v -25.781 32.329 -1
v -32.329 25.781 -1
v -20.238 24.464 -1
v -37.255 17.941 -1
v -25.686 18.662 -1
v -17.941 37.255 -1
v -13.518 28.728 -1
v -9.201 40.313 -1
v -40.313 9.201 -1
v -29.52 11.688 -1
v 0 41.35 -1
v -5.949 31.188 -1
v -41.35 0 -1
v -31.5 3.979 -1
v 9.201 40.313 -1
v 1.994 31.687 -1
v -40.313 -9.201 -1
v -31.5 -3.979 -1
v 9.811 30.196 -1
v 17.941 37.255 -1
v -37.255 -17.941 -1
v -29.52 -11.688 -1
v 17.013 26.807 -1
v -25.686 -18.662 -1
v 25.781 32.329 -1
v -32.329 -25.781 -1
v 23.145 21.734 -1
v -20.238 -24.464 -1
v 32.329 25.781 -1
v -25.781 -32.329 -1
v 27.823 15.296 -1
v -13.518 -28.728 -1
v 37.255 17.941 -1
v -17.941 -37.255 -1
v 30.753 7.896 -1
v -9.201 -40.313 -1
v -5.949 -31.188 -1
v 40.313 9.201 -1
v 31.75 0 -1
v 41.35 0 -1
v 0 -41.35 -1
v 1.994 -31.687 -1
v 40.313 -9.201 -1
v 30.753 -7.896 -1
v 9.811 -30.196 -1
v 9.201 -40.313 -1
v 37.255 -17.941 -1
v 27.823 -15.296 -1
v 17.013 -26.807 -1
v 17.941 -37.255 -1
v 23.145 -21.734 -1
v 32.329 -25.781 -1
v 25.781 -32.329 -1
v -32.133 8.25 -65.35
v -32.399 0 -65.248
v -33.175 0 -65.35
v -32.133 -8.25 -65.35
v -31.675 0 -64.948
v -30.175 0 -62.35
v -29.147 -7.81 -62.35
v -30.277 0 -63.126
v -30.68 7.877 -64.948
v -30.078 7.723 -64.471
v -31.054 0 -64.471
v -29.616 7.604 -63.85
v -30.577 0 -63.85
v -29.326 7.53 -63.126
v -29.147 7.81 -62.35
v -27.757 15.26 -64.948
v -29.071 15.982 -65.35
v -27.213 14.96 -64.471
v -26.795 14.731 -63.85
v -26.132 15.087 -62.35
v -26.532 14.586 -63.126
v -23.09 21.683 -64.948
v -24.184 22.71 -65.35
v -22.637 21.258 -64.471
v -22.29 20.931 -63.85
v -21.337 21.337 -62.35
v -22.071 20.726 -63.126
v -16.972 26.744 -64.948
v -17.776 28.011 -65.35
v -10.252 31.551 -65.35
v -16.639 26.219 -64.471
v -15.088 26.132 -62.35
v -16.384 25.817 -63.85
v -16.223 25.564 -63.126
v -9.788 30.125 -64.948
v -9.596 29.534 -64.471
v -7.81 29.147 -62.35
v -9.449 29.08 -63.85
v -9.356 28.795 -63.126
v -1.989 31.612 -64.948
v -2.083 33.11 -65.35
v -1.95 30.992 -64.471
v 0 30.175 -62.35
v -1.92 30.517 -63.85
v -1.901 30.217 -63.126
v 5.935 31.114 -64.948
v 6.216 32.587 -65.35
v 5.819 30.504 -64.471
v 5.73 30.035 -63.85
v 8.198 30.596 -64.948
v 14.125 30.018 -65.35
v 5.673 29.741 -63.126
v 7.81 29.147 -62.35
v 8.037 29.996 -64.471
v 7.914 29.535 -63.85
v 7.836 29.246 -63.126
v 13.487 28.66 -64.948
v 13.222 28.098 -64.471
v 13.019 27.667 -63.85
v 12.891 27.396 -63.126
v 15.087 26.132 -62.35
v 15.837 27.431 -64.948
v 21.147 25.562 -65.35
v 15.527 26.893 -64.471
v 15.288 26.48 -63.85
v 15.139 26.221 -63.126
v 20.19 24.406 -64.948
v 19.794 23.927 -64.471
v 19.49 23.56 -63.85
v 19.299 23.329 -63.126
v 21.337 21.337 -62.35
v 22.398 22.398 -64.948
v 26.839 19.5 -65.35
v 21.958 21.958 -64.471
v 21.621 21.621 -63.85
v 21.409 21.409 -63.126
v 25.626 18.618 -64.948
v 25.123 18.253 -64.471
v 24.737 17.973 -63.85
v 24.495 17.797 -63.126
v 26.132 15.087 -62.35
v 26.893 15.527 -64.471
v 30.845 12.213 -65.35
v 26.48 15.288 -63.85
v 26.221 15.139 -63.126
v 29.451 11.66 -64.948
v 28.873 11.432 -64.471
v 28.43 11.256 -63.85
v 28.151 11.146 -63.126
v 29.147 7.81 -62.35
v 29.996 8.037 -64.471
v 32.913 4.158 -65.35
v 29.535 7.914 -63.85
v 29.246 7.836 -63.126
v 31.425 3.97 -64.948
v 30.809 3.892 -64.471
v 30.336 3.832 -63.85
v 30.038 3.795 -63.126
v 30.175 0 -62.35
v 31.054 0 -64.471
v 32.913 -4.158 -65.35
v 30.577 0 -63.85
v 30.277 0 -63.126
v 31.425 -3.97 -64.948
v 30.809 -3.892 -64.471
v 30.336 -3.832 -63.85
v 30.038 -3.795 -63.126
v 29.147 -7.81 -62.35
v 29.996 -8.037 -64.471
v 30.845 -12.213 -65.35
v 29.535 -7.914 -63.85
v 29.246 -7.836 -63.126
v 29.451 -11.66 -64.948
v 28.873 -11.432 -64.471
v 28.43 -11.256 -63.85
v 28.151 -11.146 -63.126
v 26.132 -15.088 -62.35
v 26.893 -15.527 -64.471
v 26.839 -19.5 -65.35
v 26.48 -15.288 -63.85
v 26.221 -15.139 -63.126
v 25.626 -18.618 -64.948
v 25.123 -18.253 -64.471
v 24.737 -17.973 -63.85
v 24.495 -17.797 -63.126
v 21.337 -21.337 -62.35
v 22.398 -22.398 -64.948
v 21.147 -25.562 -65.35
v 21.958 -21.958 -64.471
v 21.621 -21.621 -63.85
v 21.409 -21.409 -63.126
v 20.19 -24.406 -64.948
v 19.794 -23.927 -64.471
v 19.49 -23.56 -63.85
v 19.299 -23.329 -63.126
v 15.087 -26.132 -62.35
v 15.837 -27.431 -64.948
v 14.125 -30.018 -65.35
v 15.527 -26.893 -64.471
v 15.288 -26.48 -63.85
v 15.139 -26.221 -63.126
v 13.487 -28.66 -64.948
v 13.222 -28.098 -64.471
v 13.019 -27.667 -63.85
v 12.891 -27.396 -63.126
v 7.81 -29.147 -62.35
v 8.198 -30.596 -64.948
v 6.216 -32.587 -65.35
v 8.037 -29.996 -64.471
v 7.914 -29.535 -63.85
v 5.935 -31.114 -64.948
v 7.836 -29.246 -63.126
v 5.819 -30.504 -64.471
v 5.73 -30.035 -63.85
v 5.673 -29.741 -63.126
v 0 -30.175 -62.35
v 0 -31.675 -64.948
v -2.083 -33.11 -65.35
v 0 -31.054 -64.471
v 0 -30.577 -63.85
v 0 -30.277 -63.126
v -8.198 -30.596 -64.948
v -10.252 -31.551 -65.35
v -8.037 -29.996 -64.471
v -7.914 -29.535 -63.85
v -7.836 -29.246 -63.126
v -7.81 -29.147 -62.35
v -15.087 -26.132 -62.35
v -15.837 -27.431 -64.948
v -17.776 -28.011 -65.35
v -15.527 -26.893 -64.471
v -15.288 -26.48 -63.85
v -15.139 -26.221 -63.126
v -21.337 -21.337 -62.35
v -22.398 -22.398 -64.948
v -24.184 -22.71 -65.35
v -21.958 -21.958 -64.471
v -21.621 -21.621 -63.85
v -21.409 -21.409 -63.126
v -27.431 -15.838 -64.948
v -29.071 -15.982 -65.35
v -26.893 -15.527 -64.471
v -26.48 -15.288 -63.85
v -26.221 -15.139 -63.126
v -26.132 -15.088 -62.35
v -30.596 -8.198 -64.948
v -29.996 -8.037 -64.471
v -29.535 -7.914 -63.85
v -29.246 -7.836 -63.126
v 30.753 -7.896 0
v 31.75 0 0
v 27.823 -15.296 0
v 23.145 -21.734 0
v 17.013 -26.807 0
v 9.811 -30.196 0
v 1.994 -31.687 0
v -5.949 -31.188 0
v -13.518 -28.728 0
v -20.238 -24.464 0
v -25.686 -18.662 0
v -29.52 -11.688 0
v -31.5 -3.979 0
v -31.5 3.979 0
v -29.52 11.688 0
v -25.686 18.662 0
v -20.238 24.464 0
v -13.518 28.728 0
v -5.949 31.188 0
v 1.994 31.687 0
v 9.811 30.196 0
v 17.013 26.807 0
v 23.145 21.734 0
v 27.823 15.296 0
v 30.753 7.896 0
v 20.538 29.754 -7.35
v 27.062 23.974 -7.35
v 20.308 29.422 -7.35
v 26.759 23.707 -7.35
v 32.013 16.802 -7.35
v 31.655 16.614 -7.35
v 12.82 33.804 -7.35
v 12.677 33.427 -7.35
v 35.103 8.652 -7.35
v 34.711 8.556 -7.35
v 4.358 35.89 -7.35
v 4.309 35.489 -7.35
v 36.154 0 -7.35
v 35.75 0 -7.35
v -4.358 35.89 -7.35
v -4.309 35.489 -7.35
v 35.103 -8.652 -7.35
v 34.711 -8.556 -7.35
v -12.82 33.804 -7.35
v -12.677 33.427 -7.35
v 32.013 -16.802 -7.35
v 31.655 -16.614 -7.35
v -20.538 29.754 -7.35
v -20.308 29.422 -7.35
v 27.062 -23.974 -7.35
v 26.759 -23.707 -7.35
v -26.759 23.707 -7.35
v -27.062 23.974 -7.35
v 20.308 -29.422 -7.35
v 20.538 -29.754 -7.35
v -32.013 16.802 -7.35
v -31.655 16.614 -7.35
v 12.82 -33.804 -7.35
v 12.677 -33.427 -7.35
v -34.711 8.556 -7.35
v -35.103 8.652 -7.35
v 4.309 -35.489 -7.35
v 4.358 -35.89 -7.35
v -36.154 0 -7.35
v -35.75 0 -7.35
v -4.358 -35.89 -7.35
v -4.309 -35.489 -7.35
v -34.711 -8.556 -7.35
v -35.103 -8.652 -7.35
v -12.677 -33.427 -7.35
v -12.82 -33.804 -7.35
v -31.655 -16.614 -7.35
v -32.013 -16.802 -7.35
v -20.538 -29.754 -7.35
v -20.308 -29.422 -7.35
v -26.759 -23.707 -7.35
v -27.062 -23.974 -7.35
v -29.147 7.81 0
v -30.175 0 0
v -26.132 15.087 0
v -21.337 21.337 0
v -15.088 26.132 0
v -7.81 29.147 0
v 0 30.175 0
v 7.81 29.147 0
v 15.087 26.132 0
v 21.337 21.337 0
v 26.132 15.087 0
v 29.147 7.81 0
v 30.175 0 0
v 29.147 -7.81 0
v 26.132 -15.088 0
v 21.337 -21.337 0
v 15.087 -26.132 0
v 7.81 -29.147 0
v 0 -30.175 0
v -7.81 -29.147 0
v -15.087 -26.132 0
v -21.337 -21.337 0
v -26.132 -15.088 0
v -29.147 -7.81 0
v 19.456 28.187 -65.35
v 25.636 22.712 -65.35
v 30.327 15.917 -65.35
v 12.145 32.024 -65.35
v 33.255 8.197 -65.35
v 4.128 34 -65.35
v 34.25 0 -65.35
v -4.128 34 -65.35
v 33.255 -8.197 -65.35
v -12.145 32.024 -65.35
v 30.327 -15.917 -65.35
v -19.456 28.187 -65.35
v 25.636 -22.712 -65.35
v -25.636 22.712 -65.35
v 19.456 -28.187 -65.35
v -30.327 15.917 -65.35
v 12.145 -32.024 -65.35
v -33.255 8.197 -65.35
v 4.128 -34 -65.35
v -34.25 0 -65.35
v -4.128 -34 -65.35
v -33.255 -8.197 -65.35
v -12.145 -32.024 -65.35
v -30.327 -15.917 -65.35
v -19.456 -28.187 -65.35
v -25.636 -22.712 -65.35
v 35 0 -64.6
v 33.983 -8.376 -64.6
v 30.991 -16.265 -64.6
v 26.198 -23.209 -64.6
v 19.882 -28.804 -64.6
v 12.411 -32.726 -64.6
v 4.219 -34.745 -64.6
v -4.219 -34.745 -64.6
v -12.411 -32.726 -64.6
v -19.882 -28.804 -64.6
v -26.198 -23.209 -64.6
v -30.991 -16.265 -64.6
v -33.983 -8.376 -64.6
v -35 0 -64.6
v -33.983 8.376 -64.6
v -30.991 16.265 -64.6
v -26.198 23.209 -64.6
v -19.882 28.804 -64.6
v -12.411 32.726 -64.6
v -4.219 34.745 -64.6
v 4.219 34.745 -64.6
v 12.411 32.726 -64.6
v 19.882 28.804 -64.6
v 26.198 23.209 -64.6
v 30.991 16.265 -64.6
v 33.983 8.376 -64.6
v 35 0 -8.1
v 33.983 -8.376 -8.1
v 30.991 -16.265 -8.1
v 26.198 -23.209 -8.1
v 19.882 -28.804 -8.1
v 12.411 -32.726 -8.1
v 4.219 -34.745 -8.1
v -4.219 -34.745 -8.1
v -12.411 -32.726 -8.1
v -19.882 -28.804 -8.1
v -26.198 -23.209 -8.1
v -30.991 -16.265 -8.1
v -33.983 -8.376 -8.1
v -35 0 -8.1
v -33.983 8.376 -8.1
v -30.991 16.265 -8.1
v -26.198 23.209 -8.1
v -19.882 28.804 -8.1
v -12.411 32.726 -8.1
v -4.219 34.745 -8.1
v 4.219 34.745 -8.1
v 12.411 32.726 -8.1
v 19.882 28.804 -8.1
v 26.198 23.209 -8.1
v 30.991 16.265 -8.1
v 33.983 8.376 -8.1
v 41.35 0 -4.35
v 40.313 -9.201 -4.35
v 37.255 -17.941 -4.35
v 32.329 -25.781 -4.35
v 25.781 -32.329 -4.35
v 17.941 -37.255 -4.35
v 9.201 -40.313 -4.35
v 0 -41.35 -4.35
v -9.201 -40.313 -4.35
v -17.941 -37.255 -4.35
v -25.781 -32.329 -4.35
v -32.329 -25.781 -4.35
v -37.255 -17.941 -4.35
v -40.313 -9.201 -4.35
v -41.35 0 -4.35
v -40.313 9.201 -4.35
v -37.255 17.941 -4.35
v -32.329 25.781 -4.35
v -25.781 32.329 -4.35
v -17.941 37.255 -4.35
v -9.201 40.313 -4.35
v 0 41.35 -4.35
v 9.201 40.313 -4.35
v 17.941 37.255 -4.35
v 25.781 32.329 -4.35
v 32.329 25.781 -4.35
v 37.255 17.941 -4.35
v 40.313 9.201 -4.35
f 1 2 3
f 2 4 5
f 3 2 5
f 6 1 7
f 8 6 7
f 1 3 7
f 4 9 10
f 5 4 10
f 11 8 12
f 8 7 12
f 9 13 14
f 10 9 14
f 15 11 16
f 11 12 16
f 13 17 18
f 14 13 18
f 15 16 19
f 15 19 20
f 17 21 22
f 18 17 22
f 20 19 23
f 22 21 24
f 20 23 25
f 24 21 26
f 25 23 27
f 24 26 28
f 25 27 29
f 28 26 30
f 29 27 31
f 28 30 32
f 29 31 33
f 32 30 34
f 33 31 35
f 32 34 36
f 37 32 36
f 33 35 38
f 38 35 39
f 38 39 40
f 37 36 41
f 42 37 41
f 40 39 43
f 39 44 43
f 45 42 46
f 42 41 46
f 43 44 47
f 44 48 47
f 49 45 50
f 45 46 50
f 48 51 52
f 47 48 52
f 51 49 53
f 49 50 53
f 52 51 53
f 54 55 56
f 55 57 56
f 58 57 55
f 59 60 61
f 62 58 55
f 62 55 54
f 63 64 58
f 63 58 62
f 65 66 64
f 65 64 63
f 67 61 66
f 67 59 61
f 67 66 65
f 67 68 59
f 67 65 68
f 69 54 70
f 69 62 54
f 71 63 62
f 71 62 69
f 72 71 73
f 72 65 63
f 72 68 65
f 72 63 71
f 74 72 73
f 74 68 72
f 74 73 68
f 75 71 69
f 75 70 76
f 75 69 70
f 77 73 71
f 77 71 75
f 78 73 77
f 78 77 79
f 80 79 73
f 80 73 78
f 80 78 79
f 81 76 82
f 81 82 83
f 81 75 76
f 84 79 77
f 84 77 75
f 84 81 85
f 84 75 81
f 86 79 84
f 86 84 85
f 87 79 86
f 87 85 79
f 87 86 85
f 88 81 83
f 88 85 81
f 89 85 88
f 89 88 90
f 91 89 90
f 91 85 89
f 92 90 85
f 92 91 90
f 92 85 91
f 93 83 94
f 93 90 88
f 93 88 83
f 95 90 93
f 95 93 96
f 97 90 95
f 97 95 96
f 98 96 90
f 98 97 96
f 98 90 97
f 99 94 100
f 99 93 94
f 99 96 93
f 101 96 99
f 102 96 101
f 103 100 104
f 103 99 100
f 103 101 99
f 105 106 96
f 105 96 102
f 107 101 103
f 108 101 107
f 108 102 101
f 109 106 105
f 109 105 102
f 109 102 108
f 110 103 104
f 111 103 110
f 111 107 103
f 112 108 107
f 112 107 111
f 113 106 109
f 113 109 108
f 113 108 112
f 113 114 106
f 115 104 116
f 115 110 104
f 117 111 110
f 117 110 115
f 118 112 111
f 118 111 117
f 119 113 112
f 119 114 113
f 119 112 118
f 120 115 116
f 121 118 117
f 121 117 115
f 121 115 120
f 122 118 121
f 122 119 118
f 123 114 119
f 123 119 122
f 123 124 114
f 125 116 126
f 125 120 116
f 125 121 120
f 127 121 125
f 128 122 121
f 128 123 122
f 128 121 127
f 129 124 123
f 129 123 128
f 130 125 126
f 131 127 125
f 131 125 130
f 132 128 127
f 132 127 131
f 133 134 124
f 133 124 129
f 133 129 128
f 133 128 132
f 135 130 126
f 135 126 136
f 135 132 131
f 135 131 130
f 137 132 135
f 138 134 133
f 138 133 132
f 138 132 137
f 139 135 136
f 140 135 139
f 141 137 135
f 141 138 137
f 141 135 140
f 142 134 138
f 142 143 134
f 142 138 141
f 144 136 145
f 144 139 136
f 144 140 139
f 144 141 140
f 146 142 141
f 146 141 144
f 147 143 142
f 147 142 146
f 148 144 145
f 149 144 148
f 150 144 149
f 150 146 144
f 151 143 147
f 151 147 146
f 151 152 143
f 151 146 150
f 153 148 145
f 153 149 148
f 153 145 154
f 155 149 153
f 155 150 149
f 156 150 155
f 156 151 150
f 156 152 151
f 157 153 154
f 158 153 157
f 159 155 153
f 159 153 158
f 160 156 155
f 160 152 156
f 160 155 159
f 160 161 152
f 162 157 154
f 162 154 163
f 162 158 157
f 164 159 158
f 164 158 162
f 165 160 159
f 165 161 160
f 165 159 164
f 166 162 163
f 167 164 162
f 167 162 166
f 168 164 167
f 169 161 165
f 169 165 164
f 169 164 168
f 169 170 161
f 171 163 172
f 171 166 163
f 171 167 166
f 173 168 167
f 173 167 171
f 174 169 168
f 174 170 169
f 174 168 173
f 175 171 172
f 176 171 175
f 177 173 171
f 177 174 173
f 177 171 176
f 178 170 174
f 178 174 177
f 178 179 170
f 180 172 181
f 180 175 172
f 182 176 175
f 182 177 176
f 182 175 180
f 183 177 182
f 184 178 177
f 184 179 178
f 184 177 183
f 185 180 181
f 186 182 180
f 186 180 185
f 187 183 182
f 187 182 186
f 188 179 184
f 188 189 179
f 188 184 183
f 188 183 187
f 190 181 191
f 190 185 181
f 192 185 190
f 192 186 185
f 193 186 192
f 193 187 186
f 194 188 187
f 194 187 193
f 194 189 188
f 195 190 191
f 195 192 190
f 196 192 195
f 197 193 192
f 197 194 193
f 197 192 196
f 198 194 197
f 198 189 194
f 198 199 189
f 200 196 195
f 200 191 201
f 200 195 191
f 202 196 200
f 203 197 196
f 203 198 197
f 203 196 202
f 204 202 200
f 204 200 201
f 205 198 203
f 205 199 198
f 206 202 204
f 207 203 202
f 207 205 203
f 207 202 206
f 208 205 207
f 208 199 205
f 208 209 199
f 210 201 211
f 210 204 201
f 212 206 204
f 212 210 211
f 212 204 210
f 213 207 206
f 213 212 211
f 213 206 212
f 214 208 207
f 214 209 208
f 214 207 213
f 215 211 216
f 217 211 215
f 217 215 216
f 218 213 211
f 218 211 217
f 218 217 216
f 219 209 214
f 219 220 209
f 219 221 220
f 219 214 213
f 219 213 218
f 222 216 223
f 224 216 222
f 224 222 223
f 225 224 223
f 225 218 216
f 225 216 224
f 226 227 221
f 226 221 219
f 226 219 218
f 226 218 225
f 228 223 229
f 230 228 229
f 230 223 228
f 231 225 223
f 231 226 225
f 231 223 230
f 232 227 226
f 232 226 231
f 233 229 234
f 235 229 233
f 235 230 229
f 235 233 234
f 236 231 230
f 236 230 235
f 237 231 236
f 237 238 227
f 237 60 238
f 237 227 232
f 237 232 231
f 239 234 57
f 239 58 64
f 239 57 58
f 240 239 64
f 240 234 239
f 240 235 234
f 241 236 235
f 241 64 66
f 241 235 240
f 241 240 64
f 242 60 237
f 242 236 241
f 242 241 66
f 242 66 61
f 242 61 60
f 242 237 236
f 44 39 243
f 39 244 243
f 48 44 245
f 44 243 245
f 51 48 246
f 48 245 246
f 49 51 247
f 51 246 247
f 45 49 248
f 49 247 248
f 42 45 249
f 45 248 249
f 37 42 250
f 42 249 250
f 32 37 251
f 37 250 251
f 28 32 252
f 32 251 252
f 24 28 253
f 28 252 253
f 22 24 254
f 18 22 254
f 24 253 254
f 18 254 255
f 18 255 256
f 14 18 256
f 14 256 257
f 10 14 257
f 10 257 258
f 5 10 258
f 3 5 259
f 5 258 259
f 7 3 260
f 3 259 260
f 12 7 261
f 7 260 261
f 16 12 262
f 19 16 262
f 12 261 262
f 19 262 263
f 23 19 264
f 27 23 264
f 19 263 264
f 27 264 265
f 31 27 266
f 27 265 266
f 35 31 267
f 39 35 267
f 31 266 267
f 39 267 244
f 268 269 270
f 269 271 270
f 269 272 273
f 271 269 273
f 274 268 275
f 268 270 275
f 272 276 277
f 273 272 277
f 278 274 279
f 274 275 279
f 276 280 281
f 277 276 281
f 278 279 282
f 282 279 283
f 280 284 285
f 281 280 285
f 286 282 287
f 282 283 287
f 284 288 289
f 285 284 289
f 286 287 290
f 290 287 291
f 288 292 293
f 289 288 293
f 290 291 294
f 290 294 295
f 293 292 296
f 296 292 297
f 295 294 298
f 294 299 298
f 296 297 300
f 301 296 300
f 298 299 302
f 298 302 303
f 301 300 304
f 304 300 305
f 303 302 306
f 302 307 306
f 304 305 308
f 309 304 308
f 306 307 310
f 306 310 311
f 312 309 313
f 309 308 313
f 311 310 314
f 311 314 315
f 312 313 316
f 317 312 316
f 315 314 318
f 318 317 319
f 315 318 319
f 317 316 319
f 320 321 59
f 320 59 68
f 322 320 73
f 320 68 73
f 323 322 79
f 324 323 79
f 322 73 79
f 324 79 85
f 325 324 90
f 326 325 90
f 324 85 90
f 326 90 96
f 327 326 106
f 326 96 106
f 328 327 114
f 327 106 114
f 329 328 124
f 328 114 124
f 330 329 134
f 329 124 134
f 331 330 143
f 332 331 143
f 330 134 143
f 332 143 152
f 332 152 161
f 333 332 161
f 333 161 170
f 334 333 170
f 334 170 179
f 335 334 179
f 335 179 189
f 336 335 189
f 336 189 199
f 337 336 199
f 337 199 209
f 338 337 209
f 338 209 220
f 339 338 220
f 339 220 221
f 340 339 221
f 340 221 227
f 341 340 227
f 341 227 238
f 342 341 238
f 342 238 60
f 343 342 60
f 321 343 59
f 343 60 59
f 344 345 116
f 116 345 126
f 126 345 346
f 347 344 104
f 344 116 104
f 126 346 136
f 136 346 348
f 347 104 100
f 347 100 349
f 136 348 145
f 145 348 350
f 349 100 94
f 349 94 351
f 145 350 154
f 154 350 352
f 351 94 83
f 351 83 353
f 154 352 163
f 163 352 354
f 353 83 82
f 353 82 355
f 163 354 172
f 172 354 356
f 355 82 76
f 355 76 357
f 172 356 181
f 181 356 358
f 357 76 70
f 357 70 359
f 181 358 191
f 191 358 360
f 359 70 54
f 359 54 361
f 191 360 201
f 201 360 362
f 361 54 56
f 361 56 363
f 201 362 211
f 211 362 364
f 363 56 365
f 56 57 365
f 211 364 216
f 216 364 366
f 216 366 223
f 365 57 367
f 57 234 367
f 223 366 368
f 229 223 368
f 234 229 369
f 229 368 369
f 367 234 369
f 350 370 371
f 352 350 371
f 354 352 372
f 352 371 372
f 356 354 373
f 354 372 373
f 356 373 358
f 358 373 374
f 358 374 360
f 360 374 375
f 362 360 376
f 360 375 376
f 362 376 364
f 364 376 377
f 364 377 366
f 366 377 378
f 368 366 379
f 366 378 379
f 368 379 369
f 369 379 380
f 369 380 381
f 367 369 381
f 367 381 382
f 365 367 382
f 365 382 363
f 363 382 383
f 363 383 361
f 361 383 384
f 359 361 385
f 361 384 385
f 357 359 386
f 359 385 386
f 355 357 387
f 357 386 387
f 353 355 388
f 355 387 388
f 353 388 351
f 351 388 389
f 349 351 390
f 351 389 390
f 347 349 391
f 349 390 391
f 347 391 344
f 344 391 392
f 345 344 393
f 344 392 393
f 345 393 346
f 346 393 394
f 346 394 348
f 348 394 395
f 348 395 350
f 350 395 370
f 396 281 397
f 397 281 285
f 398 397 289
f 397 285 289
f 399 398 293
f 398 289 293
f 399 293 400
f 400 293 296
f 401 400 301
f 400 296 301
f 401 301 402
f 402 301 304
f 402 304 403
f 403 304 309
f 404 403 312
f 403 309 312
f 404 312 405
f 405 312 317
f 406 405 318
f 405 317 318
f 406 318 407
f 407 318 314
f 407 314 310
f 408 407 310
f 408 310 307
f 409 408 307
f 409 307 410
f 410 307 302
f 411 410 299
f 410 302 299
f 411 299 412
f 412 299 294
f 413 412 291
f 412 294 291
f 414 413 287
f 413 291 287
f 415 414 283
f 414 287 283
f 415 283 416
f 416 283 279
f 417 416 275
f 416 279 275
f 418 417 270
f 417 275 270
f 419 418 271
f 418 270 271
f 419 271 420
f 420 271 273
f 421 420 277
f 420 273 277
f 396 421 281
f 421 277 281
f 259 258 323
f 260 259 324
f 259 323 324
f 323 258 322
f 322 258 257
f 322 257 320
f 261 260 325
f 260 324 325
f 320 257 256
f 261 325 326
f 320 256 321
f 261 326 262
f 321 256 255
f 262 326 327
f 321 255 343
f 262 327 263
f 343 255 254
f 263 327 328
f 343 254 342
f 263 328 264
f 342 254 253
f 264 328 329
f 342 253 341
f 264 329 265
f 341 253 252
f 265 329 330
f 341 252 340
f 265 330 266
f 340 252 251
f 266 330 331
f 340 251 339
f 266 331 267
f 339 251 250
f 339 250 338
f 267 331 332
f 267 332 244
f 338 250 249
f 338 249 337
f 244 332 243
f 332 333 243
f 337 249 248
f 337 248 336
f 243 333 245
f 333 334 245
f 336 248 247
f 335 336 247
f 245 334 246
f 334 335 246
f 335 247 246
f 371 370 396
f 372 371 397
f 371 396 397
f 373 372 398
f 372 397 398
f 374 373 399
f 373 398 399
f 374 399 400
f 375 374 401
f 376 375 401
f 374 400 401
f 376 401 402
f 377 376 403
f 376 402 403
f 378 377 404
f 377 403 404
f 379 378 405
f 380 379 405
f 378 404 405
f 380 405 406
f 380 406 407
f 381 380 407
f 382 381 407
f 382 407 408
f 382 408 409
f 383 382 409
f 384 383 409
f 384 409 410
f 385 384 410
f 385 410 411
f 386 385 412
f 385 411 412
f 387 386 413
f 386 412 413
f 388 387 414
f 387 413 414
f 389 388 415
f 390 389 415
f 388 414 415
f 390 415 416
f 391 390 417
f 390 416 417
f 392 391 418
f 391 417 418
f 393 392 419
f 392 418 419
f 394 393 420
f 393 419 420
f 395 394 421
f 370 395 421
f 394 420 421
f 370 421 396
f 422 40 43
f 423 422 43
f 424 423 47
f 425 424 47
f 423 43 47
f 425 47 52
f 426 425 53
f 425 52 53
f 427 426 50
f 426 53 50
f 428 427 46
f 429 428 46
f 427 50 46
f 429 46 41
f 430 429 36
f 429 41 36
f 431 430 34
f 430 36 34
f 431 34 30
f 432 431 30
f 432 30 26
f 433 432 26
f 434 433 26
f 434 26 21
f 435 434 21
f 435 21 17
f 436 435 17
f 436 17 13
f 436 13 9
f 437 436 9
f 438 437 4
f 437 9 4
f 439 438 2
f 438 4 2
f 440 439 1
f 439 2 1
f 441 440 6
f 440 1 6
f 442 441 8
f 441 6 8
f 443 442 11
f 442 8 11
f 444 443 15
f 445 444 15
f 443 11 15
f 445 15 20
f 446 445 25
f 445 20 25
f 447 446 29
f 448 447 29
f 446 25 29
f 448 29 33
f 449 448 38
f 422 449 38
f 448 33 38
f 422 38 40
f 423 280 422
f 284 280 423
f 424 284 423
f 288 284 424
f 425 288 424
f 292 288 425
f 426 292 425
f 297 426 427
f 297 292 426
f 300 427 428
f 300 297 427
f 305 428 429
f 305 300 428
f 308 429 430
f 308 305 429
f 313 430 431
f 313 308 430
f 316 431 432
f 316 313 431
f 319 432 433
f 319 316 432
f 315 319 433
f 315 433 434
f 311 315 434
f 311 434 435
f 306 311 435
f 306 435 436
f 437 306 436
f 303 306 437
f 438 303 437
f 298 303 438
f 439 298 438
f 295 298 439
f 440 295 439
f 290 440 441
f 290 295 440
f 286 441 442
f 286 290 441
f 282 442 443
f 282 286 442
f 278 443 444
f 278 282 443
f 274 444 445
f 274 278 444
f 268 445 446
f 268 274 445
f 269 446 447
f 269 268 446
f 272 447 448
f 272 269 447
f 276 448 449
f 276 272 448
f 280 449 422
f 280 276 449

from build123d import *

# Parameters (mm, degrees)
SKETCH2_R          = 30.175
CUT_EXTRUDE1_DEPTH = 88.694170274
CHAMFER1_SIZE      = 0.75
CHAMFER2_SIZE      = 3
CHAMFER2_SIZE2     = 5.196152423
FILLET1_R          = 3


with BuildPart() as part:
    # Sketch1 → Revolve1 (revolve)
    with BuildSketch(Plane(origin=(0, 0, 0), x_dir=(1, 0, 0), z_dir=(0, 1, 0)), mode=Mode.PRIVATE) as revolve1_sk:
        Polygon((0, 0), (0, 65.35), (-35, 65.35), (-35, 7.35), (-41.35, 7.35), (-41.35, 1), (-31.75, 1), (-31.75, 0), align=None)
    revolve(revolve1_sk.sketch.rotate(Axis((0, 0, 0), (0, 0, -1)), 180), axis=Axis((0, 0, 0), (0, 0, -1)))

    # Sketch2 → Cut-Extrude1 (cut, through all)
    with BuildSketch(Plane(origin=(0, 0, -65.35), x_dir=(-1, 0, 0), z_dir=(0, 0, -1))):
        Circle(SKETCH2_R)
    extrude(amount=-CUT_EXTRUDE1_DEPTH, mode=Mode.SUBTRACT)

    # Chamfer1
    chamfer1_edges = [part.edges().sort_by_distance(p)[0] for p in [
        (-35, 0, -7.35),
        (-35, 0, -65.35),
    ]]
    chamfer(chamfer1_edges, length=CHAMFER1_SIZE)

    # Chamfer2
    chamfer2_edges = [part.edges().sort_by_distance(p)[0] for p in [
        (-41.35, 0, -7.35),
    ]]
    chamfer2_side = [part.faces().sort_by_distance(p)[0] for p in [
        (-41.35, 0, -4.175),
    ]]
    chamfer(chamfer2_edges, length=CHAMFER2_SIZE, length2=CHAMFER2_SIZE2, reference=chamfer2_side[0])

    # Fillet1
    fillet1_edges = [part.edges().sort_by_distance(p)[0] for p in [
        (30.175, 0, -65.35),
    ]]
    fillet(fillet1_edges, radius=FILLET1_R)


solid = part.part
